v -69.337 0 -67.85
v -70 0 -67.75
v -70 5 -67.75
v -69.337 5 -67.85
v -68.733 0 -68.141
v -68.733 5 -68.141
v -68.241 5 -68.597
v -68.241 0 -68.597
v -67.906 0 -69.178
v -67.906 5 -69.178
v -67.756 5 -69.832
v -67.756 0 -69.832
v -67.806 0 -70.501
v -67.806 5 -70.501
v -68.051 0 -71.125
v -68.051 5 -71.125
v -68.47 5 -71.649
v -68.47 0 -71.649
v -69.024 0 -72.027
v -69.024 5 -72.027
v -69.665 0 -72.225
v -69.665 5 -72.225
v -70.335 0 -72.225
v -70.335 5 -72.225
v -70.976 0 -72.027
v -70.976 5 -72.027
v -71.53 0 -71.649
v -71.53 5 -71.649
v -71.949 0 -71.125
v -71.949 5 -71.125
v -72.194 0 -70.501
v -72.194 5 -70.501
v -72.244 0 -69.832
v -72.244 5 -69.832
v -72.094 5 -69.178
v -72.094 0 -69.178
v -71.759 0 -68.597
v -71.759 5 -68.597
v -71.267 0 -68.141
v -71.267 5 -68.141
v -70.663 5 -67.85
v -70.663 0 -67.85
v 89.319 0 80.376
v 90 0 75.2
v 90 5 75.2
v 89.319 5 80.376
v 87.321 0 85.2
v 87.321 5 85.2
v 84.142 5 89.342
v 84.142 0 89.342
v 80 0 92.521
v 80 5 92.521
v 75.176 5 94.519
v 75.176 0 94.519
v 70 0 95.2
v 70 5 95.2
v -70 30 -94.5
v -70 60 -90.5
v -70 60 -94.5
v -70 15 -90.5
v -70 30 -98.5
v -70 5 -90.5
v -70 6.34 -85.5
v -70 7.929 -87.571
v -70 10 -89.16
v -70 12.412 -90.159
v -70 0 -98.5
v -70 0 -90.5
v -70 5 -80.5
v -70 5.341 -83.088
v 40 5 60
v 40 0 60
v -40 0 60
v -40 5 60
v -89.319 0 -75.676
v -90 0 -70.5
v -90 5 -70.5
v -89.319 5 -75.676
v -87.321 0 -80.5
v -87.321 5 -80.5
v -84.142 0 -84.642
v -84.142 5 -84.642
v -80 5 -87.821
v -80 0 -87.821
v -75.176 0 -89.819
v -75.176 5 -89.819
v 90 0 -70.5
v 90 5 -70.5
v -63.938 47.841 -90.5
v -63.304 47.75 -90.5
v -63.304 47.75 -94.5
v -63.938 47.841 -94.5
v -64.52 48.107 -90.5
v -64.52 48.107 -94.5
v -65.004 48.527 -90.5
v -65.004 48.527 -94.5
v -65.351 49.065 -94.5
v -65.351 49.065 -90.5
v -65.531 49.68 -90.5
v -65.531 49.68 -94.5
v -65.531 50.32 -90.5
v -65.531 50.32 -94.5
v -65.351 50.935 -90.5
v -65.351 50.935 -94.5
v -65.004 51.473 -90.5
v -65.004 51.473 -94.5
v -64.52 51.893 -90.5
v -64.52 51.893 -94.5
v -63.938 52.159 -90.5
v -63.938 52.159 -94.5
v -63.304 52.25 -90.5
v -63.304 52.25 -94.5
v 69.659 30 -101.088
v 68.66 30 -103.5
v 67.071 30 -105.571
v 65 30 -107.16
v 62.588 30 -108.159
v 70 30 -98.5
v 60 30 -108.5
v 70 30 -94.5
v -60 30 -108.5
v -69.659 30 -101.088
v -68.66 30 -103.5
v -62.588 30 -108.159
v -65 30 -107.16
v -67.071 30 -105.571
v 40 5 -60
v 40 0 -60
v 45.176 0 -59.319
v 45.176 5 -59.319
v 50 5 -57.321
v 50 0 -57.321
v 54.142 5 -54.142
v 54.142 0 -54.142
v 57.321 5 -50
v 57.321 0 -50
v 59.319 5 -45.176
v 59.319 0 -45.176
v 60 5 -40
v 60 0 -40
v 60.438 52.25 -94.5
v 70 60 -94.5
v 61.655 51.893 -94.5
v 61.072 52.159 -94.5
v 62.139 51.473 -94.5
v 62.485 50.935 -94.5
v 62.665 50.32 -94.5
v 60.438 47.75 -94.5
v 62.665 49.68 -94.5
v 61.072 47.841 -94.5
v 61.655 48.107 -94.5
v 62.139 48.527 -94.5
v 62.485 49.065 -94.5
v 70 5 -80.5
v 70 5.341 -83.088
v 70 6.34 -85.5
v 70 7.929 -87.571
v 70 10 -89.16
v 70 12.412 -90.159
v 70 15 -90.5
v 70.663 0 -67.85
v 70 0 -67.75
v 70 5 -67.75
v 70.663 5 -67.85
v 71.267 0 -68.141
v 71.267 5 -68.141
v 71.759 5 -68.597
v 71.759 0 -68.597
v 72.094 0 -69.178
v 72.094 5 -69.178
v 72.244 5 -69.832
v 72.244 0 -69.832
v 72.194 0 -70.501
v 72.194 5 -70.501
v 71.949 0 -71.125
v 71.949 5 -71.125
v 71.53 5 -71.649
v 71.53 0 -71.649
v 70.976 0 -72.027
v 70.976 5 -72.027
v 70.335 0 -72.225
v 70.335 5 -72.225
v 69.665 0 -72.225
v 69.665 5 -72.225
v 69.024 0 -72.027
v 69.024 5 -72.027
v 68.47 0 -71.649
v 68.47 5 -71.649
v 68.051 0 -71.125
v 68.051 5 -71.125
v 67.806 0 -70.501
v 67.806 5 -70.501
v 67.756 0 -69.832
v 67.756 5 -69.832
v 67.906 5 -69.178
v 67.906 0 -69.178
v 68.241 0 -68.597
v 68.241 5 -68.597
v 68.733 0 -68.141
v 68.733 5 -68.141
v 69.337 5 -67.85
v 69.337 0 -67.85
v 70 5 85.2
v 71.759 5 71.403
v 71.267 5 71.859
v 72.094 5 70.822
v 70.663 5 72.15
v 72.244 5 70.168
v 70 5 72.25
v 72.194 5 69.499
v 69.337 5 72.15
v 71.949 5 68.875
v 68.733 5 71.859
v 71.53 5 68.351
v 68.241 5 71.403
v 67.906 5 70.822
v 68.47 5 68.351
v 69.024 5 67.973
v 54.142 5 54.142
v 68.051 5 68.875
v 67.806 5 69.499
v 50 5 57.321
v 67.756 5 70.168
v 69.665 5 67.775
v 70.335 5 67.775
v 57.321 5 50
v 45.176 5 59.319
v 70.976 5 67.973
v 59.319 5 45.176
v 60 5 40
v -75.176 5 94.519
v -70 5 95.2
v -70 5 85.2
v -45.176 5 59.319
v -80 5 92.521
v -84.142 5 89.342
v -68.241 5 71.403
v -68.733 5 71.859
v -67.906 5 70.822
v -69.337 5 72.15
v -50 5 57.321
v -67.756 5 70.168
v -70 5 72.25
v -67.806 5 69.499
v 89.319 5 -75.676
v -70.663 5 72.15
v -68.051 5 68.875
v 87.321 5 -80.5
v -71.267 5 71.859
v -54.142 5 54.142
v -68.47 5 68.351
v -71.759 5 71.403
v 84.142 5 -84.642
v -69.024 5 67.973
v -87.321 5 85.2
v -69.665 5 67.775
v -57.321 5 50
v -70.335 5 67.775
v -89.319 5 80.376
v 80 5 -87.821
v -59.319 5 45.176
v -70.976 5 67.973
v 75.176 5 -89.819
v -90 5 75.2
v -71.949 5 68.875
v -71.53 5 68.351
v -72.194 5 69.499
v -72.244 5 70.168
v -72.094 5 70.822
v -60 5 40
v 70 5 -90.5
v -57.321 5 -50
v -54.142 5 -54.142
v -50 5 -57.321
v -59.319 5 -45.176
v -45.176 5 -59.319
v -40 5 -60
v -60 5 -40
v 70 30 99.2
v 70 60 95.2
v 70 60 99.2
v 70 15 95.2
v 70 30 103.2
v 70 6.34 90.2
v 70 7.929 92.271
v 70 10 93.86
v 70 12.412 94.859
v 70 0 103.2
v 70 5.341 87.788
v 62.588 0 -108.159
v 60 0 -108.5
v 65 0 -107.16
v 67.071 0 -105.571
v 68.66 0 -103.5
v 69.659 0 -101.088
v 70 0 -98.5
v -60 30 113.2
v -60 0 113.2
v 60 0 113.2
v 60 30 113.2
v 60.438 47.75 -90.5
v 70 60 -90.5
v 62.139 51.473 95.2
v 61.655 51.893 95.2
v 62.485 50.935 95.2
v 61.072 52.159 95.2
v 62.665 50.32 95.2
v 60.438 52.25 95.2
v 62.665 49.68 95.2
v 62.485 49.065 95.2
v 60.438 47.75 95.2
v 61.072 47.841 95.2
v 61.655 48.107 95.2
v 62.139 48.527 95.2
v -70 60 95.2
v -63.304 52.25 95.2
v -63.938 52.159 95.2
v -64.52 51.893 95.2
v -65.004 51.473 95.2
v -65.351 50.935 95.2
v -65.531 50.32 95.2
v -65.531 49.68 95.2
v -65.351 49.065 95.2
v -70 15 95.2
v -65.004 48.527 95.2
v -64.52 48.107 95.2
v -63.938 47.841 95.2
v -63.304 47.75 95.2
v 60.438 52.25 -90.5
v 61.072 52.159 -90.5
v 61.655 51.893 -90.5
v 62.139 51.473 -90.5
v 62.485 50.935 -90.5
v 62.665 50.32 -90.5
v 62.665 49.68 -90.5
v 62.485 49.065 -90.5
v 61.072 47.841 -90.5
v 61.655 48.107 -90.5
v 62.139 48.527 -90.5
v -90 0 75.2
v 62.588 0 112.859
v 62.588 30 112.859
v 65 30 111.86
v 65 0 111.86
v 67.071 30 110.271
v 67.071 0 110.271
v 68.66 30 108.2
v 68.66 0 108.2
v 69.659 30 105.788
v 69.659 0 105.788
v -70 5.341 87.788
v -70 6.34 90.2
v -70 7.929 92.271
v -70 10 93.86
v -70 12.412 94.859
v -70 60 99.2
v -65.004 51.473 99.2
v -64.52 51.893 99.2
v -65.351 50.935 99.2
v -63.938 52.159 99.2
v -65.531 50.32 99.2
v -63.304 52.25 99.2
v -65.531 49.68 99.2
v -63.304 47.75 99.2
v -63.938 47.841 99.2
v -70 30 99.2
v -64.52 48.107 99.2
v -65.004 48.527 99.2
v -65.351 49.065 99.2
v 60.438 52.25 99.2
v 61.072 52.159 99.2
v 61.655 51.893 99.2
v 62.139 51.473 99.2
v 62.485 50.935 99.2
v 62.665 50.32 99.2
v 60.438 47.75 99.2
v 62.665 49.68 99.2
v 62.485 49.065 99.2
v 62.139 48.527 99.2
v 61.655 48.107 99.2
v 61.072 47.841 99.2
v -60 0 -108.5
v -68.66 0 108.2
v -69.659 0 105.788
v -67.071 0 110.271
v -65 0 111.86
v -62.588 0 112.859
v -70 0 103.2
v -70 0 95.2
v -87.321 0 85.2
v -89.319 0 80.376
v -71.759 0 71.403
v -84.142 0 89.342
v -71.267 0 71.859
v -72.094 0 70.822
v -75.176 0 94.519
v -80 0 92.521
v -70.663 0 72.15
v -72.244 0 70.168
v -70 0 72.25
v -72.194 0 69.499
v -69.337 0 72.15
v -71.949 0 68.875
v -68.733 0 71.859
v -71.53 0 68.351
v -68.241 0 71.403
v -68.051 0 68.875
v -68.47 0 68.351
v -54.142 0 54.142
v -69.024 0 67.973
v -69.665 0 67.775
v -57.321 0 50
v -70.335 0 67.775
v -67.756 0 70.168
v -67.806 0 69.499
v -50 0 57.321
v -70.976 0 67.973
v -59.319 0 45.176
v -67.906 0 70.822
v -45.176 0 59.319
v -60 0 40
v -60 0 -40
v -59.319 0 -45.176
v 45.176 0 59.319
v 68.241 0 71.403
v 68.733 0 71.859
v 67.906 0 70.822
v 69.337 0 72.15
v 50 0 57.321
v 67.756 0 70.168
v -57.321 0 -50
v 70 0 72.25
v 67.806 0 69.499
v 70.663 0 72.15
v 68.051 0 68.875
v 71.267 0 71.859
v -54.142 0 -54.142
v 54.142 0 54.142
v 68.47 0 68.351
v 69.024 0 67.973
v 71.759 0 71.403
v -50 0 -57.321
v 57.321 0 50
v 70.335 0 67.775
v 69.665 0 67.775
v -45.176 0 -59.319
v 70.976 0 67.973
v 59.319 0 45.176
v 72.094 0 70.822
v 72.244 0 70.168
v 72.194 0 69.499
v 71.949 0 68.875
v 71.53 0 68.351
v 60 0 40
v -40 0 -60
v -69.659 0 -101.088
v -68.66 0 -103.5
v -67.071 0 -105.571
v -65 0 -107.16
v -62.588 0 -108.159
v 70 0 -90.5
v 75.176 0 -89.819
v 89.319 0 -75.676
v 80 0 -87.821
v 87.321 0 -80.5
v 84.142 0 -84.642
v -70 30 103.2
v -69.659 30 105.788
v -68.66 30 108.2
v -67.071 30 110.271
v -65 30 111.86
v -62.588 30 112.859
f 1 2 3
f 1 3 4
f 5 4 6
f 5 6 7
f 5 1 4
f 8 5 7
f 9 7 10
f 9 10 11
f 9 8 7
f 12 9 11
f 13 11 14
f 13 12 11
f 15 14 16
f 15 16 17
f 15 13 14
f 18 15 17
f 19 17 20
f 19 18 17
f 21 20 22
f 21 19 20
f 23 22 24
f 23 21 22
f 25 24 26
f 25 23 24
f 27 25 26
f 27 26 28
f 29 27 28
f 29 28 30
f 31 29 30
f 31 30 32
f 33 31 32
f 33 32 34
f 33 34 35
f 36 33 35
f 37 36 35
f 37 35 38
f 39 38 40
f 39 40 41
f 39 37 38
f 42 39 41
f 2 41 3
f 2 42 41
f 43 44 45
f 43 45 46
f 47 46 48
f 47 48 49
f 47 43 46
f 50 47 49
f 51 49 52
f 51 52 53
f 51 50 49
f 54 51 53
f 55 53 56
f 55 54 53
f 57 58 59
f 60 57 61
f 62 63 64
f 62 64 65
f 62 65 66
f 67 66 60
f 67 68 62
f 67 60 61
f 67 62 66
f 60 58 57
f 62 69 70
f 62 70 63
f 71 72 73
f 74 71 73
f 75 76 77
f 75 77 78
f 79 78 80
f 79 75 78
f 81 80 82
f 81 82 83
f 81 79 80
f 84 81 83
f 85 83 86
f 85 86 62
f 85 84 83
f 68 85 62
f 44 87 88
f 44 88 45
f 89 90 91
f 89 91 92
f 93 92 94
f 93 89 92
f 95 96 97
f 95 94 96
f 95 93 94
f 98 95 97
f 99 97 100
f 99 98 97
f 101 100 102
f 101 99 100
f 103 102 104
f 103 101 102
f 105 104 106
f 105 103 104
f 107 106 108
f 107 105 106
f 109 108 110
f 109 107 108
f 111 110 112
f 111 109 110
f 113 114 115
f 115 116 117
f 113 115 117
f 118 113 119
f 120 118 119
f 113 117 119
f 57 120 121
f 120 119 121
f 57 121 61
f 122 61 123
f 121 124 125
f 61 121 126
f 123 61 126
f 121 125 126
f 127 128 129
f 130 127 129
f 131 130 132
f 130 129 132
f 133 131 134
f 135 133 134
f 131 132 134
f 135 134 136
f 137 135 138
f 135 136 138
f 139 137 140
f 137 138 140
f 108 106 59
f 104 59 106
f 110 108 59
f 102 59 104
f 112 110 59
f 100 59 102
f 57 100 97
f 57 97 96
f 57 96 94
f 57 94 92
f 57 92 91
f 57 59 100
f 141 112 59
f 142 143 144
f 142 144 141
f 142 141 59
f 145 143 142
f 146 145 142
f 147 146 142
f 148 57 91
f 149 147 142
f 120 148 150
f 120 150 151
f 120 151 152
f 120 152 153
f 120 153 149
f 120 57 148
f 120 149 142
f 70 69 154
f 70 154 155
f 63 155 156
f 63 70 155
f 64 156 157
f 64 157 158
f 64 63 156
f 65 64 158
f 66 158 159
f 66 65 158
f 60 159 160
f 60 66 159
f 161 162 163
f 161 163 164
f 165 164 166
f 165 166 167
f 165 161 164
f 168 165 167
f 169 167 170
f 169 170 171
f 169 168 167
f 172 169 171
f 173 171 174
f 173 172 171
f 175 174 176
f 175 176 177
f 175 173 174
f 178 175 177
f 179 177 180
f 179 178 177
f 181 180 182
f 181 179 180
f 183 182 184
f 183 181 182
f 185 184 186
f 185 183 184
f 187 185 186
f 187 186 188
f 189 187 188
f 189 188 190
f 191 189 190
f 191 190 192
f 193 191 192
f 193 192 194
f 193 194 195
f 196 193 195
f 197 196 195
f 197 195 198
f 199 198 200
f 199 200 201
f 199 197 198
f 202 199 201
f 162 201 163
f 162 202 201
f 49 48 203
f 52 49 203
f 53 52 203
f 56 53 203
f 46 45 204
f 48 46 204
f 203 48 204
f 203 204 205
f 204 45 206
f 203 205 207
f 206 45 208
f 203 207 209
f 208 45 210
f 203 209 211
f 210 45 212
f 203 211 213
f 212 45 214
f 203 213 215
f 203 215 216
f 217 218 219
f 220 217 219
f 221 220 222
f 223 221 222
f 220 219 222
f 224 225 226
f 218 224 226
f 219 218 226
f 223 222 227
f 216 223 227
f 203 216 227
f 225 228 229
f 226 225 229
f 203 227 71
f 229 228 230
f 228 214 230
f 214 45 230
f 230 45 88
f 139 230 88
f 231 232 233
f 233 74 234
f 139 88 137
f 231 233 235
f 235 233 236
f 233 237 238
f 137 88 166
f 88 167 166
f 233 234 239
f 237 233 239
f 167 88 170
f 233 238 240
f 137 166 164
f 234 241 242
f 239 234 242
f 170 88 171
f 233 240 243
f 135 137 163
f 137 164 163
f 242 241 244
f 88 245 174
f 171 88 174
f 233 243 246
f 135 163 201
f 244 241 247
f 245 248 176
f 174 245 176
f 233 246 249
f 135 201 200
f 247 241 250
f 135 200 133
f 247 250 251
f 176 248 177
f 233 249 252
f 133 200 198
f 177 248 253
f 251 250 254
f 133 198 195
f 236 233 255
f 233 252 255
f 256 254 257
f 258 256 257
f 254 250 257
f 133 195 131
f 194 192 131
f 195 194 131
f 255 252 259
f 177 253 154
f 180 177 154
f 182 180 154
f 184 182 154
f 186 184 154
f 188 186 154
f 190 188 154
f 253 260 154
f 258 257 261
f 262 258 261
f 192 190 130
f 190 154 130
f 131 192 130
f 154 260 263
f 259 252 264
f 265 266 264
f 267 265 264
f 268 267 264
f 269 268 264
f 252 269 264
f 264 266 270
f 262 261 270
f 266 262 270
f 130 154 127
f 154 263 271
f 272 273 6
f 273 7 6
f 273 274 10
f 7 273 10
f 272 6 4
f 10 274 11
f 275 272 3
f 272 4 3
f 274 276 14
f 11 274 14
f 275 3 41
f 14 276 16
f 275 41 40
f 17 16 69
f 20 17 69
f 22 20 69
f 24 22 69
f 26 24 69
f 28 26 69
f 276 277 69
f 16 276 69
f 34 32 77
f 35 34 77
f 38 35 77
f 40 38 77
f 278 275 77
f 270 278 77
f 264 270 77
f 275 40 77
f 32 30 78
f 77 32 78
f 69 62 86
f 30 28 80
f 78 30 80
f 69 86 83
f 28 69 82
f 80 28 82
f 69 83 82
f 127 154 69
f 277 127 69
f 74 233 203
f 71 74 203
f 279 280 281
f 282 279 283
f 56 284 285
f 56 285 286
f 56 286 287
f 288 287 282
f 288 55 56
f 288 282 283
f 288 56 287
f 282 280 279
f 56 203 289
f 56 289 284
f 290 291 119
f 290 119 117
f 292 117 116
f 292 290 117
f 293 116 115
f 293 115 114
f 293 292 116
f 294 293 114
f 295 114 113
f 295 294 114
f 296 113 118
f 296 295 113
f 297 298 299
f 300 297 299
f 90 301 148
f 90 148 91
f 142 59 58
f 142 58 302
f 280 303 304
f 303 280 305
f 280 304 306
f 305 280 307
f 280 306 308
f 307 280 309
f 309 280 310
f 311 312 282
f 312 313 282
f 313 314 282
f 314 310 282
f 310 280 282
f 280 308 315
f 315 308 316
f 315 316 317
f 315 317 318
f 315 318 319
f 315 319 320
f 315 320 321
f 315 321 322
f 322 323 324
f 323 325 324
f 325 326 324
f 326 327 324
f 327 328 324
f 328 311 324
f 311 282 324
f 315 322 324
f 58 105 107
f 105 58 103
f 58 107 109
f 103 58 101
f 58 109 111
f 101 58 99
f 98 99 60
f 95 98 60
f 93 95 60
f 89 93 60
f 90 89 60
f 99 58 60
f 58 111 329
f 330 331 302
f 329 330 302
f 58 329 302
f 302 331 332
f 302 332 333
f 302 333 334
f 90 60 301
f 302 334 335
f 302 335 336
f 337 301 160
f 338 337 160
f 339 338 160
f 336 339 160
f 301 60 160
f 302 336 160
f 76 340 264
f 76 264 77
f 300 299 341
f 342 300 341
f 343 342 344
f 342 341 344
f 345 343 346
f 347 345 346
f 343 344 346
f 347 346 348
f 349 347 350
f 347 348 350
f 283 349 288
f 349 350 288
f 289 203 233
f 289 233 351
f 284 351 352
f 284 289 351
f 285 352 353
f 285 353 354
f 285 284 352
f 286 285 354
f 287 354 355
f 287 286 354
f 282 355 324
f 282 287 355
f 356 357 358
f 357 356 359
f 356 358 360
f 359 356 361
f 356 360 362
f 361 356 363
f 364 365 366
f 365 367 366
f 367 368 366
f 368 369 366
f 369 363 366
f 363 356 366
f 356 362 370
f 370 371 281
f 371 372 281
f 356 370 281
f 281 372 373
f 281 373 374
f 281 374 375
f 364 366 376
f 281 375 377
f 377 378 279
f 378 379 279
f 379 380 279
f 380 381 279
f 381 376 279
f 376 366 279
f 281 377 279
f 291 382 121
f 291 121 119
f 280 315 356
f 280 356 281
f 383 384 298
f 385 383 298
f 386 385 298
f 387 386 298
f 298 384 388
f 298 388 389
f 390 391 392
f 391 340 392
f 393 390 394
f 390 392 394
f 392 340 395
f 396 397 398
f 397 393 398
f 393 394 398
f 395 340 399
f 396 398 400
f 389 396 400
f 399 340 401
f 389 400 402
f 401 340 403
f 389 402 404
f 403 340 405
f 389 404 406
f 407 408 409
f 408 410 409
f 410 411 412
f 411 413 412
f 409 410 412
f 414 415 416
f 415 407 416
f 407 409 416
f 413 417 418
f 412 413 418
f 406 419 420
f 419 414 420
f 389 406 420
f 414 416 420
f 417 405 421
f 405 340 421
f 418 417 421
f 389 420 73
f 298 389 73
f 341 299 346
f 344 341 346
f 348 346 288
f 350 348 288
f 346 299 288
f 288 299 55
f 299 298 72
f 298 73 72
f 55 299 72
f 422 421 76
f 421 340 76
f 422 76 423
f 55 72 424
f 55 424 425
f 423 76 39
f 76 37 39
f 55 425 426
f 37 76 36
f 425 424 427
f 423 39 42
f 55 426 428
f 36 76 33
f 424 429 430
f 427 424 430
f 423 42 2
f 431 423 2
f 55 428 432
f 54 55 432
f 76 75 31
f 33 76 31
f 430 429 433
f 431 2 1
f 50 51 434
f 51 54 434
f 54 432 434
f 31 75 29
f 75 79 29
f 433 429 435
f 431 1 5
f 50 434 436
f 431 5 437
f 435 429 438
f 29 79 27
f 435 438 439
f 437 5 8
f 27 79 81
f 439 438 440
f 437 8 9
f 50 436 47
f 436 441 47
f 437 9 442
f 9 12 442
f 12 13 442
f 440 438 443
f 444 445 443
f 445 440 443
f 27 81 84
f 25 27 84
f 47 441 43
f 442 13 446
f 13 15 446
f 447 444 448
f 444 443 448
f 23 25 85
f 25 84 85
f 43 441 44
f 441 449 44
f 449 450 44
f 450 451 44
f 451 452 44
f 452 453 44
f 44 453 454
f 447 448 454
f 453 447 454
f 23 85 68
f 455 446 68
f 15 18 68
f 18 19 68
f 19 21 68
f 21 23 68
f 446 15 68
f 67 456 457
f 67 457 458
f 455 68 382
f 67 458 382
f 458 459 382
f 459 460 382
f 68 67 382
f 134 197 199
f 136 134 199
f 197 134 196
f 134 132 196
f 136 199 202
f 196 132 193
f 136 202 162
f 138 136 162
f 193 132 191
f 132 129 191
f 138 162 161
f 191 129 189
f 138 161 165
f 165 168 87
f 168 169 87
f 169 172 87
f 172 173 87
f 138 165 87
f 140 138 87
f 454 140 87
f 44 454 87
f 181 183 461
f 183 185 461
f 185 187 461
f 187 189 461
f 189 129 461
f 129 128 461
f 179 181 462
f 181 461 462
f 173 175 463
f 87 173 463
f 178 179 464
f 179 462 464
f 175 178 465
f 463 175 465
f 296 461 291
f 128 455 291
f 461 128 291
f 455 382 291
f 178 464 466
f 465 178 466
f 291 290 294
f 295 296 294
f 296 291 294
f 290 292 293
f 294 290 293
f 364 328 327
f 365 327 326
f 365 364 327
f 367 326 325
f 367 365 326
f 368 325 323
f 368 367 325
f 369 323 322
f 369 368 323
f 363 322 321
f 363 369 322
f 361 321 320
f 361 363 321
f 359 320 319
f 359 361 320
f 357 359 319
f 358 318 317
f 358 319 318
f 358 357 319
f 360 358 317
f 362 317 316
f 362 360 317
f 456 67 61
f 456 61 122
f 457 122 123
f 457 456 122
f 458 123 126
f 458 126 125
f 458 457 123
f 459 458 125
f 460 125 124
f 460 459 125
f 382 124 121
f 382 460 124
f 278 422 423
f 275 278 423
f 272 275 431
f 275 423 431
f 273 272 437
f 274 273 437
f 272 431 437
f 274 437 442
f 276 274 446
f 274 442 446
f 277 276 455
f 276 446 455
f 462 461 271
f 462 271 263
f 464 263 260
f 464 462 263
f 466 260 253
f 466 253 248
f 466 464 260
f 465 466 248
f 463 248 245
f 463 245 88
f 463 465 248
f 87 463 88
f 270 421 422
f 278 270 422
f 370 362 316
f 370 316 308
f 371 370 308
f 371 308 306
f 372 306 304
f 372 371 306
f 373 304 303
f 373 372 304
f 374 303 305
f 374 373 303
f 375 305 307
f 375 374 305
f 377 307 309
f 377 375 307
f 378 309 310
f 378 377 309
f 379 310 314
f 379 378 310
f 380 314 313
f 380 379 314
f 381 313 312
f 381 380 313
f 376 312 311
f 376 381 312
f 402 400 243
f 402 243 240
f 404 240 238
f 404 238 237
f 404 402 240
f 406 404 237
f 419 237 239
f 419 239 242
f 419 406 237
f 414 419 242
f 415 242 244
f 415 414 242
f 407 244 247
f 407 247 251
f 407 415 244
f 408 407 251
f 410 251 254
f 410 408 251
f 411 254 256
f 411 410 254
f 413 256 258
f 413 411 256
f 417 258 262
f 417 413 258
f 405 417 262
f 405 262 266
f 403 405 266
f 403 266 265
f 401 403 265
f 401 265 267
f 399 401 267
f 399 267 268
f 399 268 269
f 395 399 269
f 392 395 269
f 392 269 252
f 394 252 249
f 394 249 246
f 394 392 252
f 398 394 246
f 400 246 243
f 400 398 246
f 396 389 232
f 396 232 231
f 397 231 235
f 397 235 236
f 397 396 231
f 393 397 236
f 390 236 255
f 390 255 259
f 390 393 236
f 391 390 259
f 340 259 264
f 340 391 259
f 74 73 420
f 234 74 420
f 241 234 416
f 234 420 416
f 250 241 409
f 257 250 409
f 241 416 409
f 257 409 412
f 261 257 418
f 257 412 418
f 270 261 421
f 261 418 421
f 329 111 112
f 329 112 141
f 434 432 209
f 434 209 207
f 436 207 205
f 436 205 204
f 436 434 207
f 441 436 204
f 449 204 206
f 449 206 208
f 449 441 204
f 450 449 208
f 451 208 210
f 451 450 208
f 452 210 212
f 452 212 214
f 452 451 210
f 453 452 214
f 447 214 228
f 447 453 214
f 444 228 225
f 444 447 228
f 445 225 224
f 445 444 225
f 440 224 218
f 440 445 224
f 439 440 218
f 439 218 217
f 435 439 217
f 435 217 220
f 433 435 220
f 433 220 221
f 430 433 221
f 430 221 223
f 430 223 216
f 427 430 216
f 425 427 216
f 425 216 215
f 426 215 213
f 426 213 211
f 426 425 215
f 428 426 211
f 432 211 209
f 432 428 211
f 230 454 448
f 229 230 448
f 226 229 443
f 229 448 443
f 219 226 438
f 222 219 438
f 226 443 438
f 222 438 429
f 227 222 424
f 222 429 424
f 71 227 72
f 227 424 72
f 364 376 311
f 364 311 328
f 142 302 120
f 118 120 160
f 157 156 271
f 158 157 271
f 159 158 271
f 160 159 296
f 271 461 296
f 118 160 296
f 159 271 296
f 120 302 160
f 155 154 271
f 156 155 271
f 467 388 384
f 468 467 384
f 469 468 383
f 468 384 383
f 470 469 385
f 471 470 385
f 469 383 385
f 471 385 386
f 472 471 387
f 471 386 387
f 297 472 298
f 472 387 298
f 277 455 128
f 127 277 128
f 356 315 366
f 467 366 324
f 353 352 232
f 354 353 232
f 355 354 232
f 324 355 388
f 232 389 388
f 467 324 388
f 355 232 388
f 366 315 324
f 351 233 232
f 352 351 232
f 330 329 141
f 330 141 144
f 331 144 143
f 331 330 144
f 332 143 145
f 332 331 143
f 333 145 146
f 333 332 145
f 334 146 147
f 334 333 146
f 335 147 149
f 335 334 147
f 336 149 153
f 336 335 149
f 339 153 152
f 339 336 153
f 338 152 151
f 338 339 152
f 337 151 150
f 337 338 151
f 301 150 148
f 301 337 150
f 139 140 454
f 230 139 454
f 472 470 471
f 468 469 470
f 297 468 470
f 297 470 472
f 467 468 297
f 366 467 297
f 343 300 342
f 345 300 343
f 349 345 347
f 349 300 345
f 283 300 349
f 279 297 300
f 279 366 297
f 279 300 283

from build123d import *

# Parameters (mm, degrees)
SKETCH1_R           = 2.25
BOSS_EXTRUDE2_DEPTH = 5
BOSS_EXTRUDE3_DEPTH = 30
SKETCH4_W           = 140
SKETCH4_H           = 4
BOSS_EXTRUDE4_DEPTH = 30
CUT_EXTRUDE1_REACH  = 236.178
FILLET1_R           = 10


with BuildPart() as part:
    # Sketch1 → Boss-Extrude2 (new body)
    with BuildSketch(Plane(origin=(0, 0, 0), x_dir=(1, 0, 0), z_dir=(0, 1, 0))):
        with BuildLine():
            Line((-70, 90.5), (70, 90.5))
            ThreePointArc((70, 90.5), (84.142135624, 84.642135624), (90, 70.5))
            Line((90, 70.5), (90, -75.2))
            ThreePointArc((90, -75.2), (84.142135624, -89.342135624), (70, -95.2))
            Line((70, -95.2), (-70, -95.2))
            ThreePointArc((-70, -95.2), (-84.142135624, -89.342135624), (-90, -75.2))
            Line((-90, -75.2), (-90, 70.5))
            ThreePointArc((-90, 70.5), (-84.142135624, 84.642135624), (-70, 90.5))
        make_face()
        with Locations(Location((-70, 70, 0), (0, 0, 270))):
            Circle(SKETCH1_R, mode=Mode.SUBTRACT)
        with Locations(Location((70, 70, 0), (0, 0, 270))):
            Circle(SKETCH1_R, mode=Mode.SUBTRACT)
        with Locations(Location((-70, -70, 0), (0, 0, 270))):
            Circle(SKETCH1_R, mode=Mode.SUBTRACT)
        with Locations(Location((70, -70, 0), (0, 0, 270))):
            Circle(SKETCH1_R, mode=Mode.SUBTRACT)
        with BuildLine():
            Line((40, -60), (-40, -60))
            ThreePointArc((-40, -60), (-54.142135624, -54.142135624), (-60, -40))
            Line((-60, -40), (-60, 40))
            ThreePointArc((-60, 40), (-54.142135624, 54.142135624), (-40, 60))
            Line((-40, 60), (40, 60))
            ThreePointArc((40, 60), (54.142135624, 54.142135624), (60, 40))
            Line((60, 40), (60, -40))
            ThreePointArc((60, -40), (54.142135624, -54.142135624), (40, -60))
        make_face(mode=Mode.SUBTRACT)
    extrude(amount=BOSS_EXTRUDE2_DEPTH)

    # Sketch1<3> → Boss-Extrude3 (add)
    with BuildSketch(Plane(origin=(0, 0, 0), x_dir=(1, 0, 0), z_dir=(0, 1, 0))):
        with BuildLine():
            Line((-70, -95.2), (-70, -103.2))
            ThreePointArc((-70, -103.2), (-67.071067812, -110.271067812), (-60, -113.2))
            Line((-60, -113.2), (60, -113.2))
            ThreePointArc((60, -113.2), (67.071067812, -110.271067812), (70, -103.2))
            Line((70, -103.2), (70, -95.2))
            Line((70, -95.2), (-70, -95.2))
        make_face()
        with BuildLine():
            ThreePointArc((-70, 98.5), (-67.071067812, 105.571067812), (-60, 108.5))
            Line((-60, 108.5), (60, 108.5))
            ThreePointArc((60, 108.5), (67.071067812, 105.571067812), (70, 98.5))
            Line((70, 98.5), (70, 90.5))
            Line((70, 90.5), (-70, 90.5))
            Line((-70, 90.5), (-70, 98.5))
        make_face()
    extrude(amount=BOSS_EXTRUDE3_DEPTH)

    # Sketch4 → Boss-Extrude4 (add)
    with BuildSketch(Plane(origin=(0, 30, 0), x_dir=(1, 0, 0), z_dir=(0, 1, 0))):
        with Locations((0, 92.5)):
            Rectangle(SKETCH4_W, SKETCH4_H)
        with Locations((0, -97.2)):
            Rectangle(SKETCH4_W, SKETCH4_H)
    extrude(amount=BOSS_EXTRUDE4_DEPTH)

    # Cut-Extrude1: up to this face of the body (flat: up to its plane)
    cut_extrude1_end = Plane(part.part.faces().sort_by_distance((0, 45, -94.5))[0])
    # Sketch5 → Cut-Extrude1 (cut, up to the picked face)
    with BuildSketch(Plane.XY.offset(99.2), mode=Mode.PRIVATE) as cut_extrude1_sk1:
        with BuildLine():
            Line((-63.303955024, 52.25), (60.438343891, 52.25))
            ThreePointArc((60.438343891, 52.25), (62.688343891, 50), (60.438343891, 47.75))
            Line((60.438343891, 47.75), (-63.303955024, 47.75))
            ThreePointArc((-63.303955024, 47.75), (-65.553955024, 50), (-63.303955024, 52.25))
        make_face()
    cut_extrude1_tool1 = split(extrude(cut_extrude1_sk1.sketch, amount=-CUT_EXTRUDE1_REACH, mode=Mode.PRIVATE), bisect_by=cut_extrude1_end, keep=Keep.BOTH, mode=Mode.PRIVATE)
    add(cut_extrude1_tool1.solids().sort_by(Axis((-1.432806, 50, 99.2), (0, 0, -1)))[0], mode=Mode.SUBTRACT)

    # Fillet1
    # the kernel refuses this fillet: 10 mm, written as the material it adds along each edge
    with BuildSketch(Plane(origin=(70, 5, 95.2), x_dir=(0, 0, -1), z_dir=(-1, 0, 0)), Plane(origin=(-70, 5, -90.5), x_dir=(0, 0, 1), z_dir=(1, 0, 0))) as fillet1_piece_1:
        with BuildLine():
            CenterArc((FILLET1_R, -FILLET1_R), FILLET1_R, 90, 90)
            Line((0, -FILLET1_R), (0, 0))
            Line((0, 0), (FILLET1_R, 0))
        make_face()
    extrude(amount=140)


solid = part.part
